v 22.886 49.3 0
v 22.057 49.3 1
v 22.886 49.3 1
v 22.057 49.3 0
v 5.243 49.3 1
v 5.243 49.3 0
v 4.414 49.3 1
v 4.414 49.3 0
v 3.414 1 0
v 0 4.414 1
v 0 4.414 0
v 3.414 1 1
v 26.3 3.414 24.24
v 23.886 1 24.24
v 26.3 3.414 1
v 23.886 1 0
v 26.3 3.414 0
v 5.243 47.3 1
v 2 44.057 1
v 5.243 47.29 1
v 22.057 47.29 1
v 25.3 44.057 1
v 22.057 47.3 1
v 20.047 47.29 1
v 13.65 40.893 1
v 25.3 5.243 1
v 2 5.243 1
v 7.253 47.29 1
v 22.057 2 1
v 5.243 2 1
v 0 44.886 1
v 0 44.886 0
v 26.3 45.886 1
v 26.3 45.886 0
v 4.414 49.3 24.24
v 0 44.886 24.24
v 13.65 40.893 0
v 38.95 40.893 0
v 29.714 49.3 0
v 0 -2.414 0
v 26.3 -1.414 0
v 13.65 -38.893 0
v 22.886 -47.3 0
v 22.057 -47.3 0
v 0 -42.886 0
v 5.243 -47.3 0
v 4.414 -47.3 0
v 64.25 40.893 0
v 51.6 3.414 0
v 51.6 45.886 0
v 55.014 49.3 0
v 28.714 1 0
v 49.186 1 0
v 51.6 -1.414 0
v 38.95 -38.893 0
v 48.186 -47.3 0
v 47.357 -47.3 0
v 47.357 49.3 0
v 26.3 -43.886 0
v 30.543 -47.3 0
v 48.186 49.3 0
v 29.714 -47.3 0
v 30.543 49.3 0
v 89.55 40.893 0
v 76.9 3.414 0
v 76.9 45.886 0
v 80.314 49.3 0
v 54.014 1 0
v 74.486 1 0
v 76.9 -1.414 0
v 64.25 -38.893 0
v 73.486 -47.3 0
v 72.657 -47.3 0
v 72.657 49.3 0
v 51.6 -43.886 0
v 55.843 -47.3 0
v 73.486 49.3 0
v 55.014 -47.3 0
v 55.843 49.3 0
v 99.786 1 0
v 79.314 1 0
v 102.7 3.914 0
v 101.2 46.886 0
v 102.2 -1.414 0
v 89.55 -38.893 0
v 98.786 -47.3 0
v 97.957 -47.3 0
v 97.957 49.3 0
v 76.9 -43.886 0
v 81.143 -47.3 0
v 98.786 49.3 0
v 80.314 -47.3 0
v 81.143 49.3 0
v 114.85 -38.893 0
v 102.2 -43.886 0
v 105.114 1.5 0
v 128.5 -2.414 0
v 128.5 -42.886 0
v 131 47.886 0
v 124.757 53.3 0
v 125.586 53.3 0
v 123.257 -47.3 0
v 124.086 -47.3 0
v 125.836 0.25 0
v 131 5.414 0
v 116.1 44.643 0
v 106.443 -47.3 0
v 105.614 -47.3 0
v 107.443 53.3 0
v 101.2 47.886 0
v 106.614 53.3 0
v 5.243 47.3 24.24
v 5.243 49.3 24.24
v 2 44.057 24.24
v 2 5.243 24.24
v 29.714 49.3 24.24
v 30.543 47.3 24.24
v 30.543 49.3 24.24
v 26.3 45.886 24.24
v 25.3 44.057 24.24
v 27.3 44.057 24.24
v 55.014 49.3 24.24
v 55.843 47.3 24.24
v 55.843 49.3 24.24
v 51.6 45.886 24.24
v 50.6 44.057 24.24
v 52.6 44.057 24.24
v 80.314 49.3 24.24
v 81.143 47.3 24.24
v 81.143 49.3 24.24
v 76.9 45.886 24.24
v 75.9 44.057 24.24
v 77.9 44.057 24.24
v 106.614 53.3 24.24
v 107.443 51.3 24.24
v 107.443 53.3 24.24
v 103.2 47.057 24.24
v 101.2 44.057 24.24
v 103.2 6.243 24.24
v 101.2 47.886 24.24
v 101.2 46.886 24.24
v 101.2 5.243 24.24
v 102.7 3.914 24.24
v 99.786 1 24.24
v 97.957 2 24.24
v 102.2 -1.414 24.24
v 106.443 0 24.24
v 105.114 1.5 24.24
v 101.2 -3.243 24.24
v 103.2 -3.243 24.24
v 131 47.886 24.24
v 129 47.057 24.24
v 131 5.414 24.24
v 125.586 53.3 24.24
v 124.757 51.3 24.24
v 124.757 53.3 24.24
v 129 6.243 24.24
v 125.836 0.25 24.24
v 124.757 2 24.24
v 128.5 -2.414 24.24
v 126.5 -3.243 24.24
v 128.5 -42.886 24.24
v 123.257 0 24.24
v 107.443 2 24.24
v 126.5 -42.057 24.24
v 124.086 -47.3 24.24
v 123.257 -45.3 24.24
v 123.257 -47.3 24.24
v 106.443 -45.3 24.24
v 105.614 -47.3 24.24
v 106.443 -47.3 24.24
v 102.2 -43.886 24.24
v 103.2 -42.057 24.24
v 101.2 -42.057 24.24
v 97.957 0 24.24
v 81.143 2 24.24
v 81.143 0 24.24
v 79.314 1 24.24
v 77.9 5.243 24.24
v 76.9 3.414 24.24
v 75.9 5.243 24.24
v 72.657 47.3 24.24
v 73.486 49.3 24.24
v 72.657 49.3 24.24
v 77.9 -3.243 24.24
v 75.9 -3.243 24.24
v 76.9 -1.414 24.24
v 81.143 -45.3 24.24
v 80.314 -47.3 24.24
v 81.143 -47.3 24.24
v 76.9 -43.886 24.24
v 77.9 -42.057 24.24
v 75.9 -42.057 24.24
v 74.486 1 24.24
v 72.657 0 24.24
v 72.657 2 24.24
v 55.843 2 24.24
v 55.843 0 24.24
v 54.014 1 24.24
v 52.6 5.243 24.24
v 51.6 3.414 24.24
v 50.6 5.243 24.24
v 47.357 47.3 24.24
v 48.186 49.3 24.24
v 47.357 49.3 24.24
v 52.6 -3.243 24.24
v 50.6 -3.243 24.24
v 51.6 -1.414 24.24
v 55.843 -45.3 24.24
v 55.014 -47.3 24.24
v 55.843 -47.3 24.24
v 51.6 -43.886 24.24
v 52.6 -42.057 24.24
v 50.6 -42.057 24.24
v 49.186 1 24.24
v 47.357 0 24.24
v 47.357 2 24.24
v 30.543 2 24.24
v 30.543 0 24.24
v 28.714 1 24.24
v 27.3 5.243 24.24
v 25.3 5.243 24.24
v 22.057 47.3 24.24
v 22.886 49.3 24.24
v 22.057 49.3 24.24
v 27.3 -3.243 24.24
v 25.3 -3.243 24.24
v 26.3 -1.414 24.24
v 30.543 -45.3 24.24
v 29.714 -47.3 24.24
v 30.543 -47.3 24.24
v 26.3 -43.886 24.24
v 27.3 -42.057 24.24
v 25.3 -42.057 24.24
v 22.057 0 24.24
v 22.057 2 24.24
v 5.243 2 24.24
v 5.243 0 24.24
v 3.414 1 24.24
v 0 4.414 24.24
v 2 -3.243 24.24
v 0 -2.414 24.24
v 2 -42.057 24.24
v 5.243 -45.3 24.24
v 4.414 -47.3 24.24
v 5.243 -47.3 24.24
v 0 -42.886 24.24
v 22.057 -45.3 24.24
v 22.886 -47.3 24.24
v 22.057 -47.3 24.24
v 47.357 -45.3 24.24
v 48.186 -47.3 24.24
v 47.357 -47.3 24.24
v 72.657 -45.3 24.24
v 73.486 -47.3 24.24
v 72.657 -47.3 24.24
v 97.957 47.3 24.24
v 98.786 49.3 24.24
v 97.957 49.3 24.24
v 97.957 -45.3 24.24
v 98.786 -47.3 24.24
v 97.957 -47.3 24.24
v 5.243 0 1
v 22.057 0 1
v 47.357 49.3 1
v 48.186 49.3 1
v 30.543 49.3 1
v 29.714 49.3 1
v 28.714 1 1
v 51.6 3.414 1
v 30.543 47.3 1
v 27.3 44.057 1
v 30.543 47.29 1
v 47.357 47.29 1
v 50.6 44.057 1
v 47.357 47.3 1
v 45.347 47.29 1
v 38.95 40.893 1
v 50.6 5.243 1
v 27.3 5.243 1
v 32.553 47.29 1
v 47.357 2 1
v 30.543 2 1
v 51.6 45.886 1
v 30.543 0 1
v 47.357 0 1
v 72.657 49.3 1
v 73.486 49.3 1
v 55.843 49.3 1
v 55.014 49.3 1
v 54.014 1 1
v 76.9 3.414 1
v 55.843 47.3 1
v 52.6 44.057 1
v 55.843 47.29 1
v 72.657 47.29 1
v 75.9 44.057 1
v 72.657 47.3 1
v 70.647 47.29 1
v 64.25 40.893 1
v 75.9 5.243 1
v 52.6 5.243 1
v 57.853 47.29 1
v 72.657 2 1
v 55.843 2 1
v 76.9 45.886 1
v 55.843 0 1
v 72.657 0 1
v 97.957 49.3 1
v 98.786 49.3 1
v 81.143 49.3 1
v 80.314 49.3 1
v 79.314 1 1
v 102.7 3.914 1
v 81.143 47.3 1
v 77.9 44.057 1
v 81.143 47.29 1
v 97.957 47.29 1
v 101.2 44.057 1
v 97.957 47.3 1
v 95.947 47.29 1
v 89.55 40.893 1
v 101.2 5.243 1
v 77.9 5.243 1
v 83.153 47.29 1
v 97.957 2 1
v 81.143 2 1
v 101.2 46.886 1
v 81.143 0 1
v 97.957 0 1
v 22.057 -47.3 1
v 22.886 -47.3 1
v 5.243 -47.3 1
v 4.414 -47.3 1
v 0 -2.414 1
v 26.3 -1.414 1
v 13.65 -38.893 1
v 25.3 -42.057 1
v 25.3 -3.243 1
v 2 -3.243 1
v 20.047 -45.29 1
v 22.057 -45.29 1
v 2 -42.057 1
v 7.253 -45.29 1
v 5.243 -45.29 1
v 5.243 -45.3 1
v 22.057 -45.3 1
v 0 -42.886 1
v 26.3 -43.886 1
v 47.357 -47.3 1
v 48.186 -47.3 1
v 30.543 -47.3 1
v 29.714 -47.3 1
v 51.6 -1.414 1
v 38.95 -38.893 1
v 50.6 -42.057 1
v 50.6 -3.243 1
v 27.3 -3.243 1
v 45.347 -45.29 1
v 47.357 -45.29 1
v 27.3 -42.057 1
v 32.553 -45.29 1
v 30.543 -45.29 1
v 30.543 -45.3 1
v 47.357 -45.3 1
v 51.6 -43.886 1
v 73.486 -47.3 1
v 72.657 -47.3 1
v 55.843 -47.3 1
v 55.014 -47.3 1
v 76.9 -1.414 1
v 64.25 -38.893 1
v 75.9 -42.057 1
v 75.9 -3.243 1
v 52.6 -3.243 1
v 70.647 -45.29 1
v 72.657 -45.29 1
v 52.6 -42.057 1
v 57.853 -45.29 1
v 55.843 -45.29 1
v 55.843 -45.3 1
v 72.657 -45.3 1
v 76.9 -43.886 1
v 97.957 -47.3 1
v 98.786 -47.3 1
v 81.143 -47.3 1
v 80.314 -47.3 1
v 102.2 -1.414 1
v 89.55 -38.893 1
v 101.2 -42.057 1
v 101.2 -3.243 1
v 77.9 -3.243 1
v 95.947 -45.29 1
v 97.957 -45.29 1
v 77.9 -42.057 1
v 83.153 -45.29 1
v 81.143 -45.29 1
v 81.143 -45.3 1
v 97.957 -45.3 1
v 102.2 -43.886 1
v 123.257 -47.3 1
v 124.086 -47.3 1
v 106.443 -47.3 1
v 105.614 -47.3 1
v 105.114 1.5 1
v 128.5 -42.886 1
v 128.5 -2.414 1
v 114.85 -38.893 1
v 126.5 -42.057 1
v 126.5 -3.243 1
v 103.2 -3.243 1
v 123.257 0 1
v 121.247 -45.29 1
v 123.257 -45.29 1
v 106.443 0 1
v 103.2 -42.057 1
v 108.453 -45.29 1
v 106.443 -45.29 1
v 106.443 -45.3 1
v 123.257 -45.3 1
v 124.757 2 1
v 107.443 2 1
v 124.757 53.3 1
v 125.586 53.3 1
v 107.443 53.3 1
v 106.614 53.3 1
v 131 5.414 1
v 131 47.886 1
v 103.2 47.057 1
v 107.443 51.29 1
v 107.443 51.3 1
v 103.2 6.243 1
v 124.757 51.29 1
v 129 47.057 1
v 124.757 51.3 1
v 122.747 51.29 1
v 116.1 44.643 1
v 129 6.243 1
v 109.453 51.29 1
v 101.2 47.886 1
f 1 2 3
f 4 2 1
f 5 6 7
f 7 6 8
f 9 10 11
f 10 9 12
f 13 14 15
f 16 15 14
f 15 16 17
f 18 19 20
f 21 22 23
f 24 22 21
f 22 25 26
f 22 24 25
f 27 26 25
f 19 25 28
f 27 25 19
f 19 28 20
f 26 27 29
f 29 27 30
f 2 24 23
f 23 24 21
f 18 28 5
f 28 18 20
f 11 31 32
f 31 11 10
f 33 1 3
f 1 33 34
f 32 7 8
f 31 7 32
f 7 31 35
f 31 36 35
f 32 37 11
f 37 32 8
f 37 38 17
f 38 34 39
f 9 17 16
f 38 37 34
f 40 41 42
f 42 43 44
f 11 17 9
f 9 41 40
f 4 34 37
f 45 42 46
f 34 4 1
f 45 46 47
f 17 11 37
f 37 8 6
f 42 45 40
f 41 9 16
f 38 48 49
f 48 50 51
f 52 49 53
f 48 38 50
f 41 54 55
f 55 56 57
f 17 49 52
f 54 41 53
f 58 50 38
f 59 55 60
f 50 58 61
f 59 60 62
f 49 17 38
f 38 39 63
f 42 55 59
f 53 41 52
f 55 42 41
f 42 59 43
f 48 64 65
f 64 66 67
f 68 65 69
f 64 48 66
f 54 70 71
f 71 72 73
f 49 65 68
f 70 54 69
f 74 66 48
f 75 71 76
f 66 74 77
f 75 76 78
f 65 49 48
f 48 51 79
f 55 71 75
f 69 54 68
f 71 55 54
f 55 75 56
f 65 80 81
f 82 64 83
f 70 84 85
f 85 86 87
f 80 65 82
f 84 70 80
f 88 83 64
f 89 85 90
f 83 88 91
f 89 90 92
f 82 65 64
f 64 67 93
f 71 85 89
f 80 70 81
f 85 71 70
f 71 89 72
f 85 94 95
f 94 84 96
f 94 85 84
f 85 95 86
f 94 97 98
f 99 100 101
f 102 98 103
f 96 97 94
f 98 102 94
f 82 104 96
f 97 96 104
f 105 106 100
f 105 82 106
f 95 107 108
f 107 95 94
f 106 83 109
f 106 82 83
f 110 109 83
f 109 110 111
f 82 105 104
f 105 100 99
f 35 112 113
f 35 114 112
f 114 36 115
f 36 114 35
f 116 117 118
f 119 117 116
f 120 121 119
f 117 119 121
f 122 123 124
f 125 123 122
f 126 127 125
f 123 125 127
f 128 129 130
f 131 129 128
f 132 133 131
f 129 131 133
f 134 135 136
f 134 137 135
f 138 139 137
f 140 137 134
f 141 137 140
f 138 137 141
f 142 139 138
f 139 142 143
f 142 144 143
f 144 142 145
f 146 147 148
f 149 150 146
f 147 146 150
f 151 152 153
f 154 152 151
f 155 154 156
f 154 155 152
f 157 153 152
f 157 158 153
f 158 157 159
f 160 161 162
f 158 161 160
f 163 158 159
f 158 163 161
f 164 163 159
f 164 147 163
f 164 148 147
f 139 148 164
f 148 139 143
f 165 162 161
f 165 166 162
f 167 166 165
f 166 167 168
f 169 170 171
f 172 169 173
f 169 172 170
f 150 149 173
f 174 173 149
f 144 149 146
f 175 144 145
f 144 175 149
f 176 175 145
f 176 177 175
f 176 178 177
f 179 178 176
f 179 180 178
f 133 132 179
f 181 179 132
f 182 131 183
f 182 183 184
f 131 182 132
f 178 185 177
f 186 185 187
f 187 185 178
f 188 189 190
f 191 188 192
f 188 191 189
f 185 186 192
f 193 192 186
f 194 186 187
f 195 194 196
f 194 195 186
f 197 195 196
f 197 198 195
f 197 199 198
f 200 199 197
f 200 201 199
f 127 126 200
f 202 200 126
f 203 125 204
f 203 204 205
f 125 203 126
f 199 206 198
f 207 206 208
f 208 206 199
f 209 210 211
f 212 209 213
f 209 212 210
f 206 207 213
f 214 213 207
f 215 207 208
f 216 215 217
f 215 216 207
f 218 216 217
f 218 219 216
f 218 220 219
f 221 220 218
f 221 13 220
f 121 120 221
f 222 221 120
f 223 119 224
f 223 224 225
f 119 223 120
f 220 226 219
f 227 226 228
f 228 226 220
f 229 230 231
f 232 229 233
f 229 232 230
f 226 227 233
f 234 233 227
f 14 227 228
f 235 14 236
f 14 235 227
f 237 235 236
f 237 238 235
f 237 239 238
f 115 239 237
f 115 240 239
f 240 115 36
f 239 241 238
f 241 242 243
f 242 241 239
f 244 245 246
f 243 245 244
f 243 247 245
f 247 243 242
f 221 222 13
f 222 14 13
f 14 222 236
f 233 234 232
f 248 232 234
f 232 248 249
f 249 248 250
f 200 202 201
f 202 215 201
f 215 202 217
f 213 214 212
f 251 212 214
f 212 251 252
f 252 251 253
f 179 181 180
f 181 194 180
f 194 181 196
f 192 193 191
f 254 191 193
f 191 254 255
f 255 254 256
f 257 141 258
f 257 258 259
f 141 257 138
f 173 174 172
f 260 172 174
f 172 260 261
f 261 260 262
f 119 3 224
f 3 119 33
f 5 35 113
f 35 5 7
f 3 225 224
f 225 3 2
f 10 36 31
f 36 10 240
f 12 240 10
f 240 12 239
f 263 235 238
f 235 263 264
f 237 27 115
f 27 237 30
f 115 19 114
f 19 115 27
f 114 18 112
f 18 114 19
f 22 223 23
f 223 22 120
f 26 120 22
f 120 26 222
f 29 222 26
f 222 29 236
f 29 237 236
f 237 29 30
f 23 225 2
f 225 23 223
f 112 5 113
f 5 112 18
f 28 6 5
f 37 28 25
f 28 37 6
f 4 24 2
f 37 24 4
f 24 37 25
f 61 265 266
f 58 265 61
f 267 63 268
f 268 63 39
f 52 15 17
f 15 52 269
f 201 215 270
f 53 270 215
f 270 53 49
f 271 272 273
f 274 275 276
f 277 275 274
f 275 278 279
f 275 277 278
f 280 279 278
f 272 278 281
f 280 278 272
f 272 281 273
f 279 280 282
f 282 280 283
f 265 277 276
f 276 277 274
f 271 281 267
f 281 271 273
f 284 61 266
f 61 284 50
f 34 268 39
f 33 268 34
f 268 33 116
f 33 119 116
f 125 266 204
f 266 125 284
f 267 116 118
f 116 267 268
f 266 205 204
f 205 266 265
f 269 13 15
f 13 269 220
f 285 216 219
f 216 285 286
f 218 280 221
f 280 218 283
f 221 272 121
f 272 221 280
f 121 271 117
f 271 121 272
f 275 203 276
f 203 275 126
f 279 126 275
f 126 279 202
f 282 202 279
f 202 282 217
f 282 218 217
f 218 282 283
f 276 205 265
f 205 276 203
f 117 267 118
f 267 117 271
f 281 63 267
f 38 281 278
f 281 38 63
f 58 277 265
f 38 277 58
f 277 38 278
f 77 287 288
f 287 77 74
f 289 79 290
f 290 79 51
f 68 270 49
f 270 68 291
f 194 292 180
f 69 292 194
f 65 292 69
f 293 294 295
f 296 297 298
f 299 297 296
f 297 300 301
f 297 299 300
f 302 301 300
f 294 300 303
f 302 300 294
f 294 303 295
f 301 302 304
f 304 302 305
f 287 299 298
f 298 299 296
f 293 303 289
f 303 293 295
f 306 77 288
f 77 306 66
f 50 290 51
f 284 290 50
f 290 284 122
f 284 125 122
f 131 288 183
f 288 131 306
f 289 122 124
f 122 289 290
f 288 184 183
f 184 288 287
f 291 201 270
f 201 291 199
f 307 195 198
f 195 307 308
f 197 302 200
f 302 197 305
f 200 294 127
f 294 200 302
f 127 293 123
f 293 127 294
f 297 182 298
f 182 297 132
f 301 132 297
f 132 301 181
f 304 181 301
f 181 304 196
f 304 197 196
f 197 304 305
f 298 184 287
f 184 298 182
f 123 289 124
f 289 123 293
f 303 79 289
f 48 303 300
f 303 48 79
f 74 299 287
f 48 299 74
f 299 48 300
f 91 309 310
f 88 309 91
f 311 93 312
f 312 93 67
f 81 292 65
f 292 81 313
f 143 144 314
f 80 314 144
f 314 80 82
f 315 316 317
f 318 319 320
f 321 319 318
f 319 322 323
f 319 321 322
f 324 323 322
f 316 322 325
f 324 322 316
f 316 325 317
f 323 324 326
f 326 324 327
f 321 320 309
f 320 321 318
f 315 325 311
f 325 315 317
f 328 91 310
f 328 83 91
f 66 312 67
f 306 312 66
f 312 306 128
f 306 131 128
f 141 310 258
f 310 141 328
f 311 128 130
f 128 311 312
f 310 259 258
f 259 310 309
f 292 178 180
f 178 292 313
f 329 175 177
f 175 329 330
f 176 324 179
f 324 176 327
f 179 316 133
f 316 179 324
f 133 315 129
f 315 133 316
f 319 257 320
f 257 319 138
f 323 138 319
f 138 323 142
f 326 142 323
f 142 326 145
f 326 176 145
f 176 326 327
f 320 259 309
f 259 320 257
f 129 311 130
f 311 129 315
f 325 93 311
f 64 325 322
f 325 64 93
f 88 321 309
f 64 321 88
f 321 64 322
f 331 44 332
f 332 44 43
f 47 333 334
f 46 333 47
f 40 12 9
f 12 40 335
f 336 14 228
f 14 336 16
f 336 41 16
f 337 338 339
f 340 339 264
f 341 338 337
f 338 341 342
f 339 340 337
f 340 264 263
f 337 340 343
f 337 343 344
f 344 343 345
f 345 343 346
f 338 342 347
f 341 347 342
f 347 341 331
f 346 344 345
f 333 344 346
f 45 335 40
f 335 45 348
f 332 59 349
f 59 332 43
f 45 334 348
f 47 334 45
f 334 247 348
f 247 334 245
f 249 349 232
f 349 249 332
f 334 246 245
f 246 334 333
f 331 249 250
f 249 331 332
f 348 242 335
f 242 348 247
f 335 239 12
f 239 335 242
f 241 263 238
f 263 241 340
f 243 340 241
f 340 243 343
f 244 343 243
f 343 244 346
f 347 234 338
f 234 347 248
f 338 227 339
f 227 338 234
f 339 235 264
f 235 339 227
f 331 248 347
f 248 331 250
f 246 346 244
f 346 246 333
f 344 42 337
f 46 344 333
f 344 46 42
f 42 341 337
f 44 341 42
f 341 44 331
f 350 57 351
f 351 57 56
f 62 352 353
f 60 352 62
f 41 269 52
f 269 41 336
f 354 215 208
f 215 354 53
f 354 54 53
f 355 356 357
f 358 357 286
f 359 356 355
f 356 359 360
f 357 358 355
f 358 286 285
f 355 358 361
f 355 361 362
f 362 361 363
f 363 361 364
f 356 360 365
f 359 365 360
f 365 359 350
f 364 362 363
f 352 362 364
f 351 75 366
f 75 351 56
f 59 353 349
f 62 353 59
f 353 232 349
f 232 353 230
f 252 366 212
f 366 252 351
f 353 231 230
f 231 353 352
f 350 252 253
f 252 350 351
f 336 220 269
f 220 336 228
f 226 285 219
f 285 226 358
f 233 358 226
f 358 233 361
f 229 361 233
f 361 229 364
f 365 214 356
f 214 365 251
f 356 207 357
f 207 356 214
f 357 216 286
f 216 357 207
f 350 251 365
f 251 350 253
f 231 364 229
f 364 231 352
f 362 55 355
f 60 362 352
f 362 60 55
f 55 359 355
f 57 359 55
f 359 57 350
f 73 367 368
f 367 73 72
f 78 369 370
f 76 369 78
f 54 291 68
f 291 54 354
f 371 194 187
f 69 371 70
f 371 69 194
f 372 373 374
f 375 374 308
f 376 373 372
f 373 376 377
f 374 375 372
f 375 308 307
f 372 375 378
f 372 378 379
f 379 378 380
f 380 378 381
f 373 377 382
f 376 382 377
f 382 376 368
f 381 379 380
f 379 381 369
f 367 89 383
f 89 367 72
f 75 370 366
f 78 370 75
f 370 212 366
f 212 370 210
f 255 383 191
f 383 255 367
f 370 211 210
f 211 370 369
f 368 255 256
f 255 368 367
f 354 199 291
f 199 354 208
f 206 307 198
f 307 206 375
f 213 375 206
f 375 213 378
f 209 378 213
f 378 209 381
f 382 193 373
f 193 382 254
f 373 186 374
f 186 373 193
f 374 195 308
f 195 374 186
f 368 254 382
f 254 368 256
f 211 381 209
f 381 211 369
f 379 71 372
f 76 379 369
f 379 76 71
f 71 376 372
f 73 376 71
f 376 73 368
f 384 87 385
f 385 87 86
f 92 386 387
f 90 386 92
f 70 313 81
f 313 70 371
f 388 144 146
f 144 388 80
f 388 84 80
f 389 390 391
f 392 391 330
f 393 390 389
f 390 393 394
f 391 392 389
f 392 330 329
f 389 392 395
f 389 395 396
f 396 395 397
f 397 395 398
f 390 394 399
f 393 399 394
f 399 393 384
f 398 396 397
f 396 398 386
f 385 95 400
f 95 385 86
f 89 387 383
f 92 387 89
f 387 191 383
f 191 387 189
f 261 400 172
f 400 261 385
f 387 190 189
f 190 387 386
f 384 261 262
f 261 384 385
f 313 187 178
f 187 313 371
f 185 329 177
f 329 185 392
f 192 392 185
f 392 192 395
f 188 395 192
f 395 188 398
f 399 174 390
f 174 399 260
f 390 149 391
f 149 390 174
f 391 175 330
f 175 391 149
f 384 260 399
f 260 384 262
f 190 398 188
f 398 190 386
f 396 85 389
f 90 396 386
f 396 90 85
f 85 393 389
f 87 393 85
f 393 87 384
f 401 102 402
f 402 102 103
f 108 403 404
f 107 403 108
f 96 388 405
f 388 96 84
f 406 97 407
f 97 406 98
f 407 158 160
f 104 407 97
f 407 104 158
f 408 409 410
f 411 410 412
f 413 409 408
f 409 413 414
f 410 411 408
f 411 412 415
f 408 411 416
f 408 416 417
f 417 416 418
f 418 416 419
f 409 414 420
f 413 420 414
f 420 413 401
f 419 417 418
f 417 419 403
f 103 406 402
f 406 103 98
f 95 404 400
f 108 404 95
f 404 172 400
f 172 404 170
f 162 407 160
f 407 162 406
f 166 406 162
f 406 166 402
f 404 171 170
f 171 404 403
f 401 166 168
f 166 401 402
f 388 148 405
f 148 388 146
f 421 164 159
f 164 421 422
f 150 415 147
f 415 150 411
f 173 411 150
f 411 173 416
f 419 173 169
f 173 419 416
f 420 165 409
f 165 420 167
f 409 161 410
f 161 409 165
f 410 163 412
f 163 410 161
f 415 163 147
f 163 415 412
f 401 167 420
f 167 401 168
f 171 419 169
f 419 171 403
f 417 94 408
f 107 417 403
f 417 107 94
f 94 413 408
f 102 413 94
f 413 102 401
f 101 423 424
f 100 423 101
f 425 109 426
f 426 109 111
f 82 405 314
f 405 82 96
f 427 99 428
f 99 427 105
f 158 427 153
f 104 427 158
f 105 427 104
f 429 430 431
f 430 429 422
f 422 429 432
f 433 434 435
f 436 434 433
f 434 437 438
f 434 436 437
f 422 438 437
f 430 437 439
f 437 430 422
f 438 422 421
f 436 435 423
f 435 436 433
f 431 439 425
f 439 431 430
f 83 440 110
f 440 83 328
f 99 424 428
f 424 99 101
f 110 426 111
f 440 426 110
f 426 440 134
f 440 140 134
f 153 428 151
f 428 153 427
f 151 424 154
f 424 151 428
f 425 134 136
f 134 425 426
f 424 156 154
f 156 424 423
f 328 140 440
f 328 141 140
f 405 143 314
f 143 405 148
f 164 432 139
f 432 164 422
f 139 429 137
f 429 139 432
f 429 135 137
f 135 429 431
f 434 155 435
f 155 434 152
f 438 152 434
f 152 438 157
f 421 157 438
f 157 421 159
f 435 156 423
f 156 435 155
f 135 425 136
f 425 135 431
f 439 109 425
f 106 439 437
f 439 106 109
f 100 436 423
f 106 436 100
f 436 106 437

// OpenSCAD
// Global resolution
//$fs = 0.1;  // Don't generate smaller facets than 0.1 mm
//$fa = 5;    // Don't generate larger angles than 5 degrees

/* [Hidden] */
// fudge sizes
// this make preview happier, but the exported model will have more faces
$f = 0.0; // set to zero when exporting
$g = 0.01; // safe to leave as non-zero

/* [Parameters] */
part = "chipHolder"; //[chipHolder:Chip Holder,chipHolderLid:Chip Holder Lid,chipHolderSizedDividedBox:Chip-sized Box,chipHolderSizedLid:Chip-sized Box Lid,goodsHolderBox:Goods Box,goodsHolderBumpyBox:Goods Bumpy Box,goodsHolderLid:Goods Lid]

//play (chip holder length and width will be increased by this much)
play = [2,2];

//thickness of the walls
wallThickness = 2; //[1:0.5:4]
//flat surfaces, also the thickness of the lid
bottomThickness = 1; //[0.5:0.5:3]
//lip of lid thickness
lipThickness = 3;
//lip fudge (will be double this value)
lipFudge = 0.25;

// How much height you have in your box (the chipHolderBox will be sized to fit on top of the chipHolder, and the goodsHolderBox will be half this height)
maxClearance = 40; //[20:60]

// Chip's thickness, length, width, cornerLength/Width
chipDimensions = [1.66, 43.3, 21.3, 3];
// Widechip's thickness, lenght, width, cornerLenght/Width
wideChipDimensions = [1.66, 47.3, 23.8, 4];

// First row - How many chip holders to make, and how many they should hold (best if all the same value)
chipCountsA = [14,14,14,14,14];
// Second row - How many chip holders to make, and how many they should hold (best if all the same value)
chipCountsB = [14,14,14,14];
// Second row, wide chip counter (if any of these chip counts do not match, the lid will not be useful)
wideChipCount = 14;

// First row - Chip counter box divison sizes. (one extra box is made with the remainder)
boxDivisionsA = [0.333,0.333];
// First row - Chip counter box division sizes. (one extra box is made with the remainder)
boxDivisionsB = [0.25,0.50];

// How big should one of the four holders be
goodsHolderBoxSize = 50;//[20:75]
// How much chamfer
goodsHolderCornerSize = 20;//[0:75]

// Print bumps on bottom of chipholder
goodsHolderBumpSize = 6;

/* [Hidden] */
goodsHolderBoxHeight = 40/2 - bottomThickness;

chipHolderHeight = max(
        max(chipDimensions[0]*max(max(chipCountsA), max(chipCountsB))),
        wideChipDimensions[0]*wideChipCount);
echo("chipHolder height:", chipHolderHeight);
echo("chipHolderLid (effective) height:", bottomThickness);

remainingHeight = maxClearance - chipHolderHeight - bottomThickness;
echo("remaining height:", remainingHeight);

/* I use these values for my smaller 3D printer and box size, so I can't use the divided box. */
// First row - How many chip holders to make, and how many they should hold (best if all the same value)
//chipCountsA = [22.5,22.5,22.5,22.5];
// Second row - How many chip holders to make, and how many they should hold (best if all the same value)
//chipCountsB = [22.5,22.5,22.5];
// Second row, wide chip counter (if any of these chip counts do not match, the lid will not be useful)
//wideChipCount = 22.5;



// one wide chip is added to the end of chipCountsB

module octagon(width, length, innerWidth, innerLength) {
    width = width / 2;
    length = length / 2;
    innerWidth = innerWidth / 2;
    innerLength = innerLength / 2;
    points = [
        [-width, innerLength], [-innerWidth, length], // top-left corner
        [innerWidth, length], [width, innerLength], // top-right corner
        [width, -innerLength], [innerWidth, -length], // bottom-right corner
        [-innerWidth, -length], [-width, -innerLength]]; // bottom-left corner
    
    translate([width, length]) polygon(points, [[0,1,2,3,4,5,6,7,8]]);
}

module surface2DToBox(height, thickness, bottomThickness, chamfer) {
    linear_extrude(bottomThickness) children(0);
    translate([0,0,bottomThickness]) linear_extrude(height) difference() {
        offset(0) children(0);
        offset(delta=-thickness, chamfer=chamfer) children(0);
    }
}

module surfaceToBox(height, thickness, bottomThickness, chamfer) {
    surface2DToBox(height, thickness, bottomThickness, chamfer) projection() children(0);
}

// print the lid part, or just the lip
module surface2DToLid(thickness, lidThickness, chamfer, printLid=true) {
    rotate([180,0,0]) translate([0,0,-lidThickness]) {
        if(printLid) {
            linear_extrude(lidThickness) offset(delta=1.5, chamfer=chamfer) children(0);
        }
        translate([0,0,-thickness]) linear_extrude(thickness) difference() {
            offset(delta=1.5, chamfer=chamfer) children(0);
            offset(delta=lipFudge) children(0);
        }
    }
}

module surfaceToLid(thickness, lidThickness, chamfer) {
    surface2DToLid(thickness, lidThickness, chamfer) projection() children(0);
}

// the inside octagon's innerWidth and innerLength is defined as:
// innerWidth - tan(theta/2) * wallThickness
// *and*
// innerLength - tan((theta-90)/2) * wallThickness
// theta is the angle produced from the right triangle sitting outside the octagon:
// theta = atan((length - innerLength)/(width - innerWidth));
// sigma = 90 - theta;
// widthAdjust = tan(theta/2) * wallThickness;
// lengthAdjust = tan(sigma/2) * wallThickness;
function hollowOctagonSolidInnerVector(width, length, innerWidth, innerLength, wallThickness) = [
    tan(atan((length - innerLength)/(width - innerWidth))/2) * wallThickness*2,
    tan(atan((width - innerWidth)/(length - innerLength))/2) * wallThickness*2
];

module octagonBox(width, length, innerWidth, innerLength, wallThickness, height, bottomWallThickness) {
    surface2DToBox(height, wallThickness, bottomWallThickness, true)
        octagon(width, length, innerWidth, innerLength);
}

module chipHolder(chipDimensions, chipCount, wallThickness, bottomWallThickness) {
    outerWidth = chipDimensions[2] + wallThickness*2 + play[0];
    outerLength = chipDimensions[1] + wallThickness*2 + play[1];
    innerWidth = outerWidth - chipDimensions[3]*2 - sqrt(2)*wallThickness;
    innerLength = outerLength - chipDimensions[3]*2 - sqrt(2)*wallThickness;
    height = chipCount * chipDimensions[0];
    innerVector = hollowOctagonSolidInnerVector(width=outerWidth, length=outerLength,
            innerWidth=innerWidth, innerLength=innerLength,
            wallThickness=wallThickness);
    cutawayWidth = innerWidth - innerVector[0];
    cutawayLength = innerLength - innerVector[1];
    
    difference() {
        octagonBox(width=outerWidth, length=outerLength,
            innerWidth=innerWidth, innerLength=innerLength,
            wallThickness=wallThickness,
            height=height,
            bottomWallThickness=bottomWallThickness);
        // side wall cutout
        translate([outerWidth/2-cutawayWidth/2,outerLength-wallThickness-$g,bottomWallThickness-$f])
            cube([cutawayWidth, wallThickness+$g+$g, height + $f+$g]);
        // bottom cutout
        translate([outerWidth/2,outerLength-cutawayWidth*sqrt(2)/2*sqrt(2)/2,-$g])
            rotate(45)
            cube([cutawayWidth*sqrt(2)/2, cutawayWidth*sqrt(2)/2, bottomWallThickness + $g*2]);
    }
}

module moveChipInRow(chipDimensions, wallThickness, i) {
    translate([(chipDimensions[2]+wallThickness+play[0])*i,0,0])
        children(0);
}

module chipHolderRow(chipDimensions, chipCounts, wallThickness, bottomWallThickness) {
    for(i = [0:len(chipCounts)-1])
        moveChipInRow(chipDimensions, wallThickness, i) 
            chipHolder(chipDimensions=chipDimensions, chipCount=chipCounts[i], wallThickness=wallThickness, bottomWallThickness=1);
}

module fullChipHolder() {
    mirror([0,1,0]) translate([0,-wallThickness,0]) chipHolderRow(chipDimensions=chipDimensions, chipCounts=chipCountsA, wallThickness=wallThickness, bottomWallThickness=bottomThickness);
    chipHolderRow(chipDimensions=chipDimensions, chipCounts=chipCountsB, wallThickness=wallThickness, bottomWallThickness=1);
    moveChipInRow(chipDimensions, wallThickness, len(chipCountsB)) chipHolder(chipDimensions=wideChipDimensions, chipCount=wideChipCount, wallThickness=wallThickness, bottomWallThickness=1);
}

function _plateWidth(chipDimensions, chipHolders, wallThickness, extraHolderWidth) =
    chipHolders*(chipDimensions[2]+wallThickness+play[0]);
function plateWidth(chipDimensions, chipHolders, wallThickness, extraHolderWidth) =
    extraHolderWidth ?
        _plateWidth(chipDimensions, chipHolders, wallThickness, extraHolderWidth) + extraHolderWidth + wallThickness + play[0] :
        _plateWidth(chipDimensions, chipHolders, wallThickness, extraHolderWidth);

module chipHolderPlate(chipDimensions, chipHolders, wallThickness, plateThickness, cornerOffset, extraHolderWidth, lengthOverride, extraLength=0) {
    width = plateWidth(chipDimensions, chipHolders, wallThickness, extraHolderWidth);
    length = lengthOverride ? lengthOverride + extraLength : chipDimensions[1] + extraLength;

    outerWidth = width + wallThickness;
    outerLength = length + wallThickness*2;
    innerWidth = outerWidth - cornerOffset*2 - sqrt(2)*wallThickness;
    innerLength = outerLength - cornerOffset*2 - sqrt(2)*wallThickness;

    linear_extrude(plateThickness)
        octagon(outerWidth,outerLength,innerWidth,innerLength);
}

module fullChipHolderPlate(extraLength=0) {
    translate([0,0,-1]) {
        mirror([0,1,0]) translate([0,-wallThickness,0]) chipHolderPlate(chipDimensions, len(chipCountsA), wallThickness, 1, chipDimensions[3], extraLength=extraLength);
        chipHolderPlate(chipDimensions, len(chipCountsB), wallThickness, 1, wideChipDimensions[3], wideChipDimensions[2], wideChipDimensions[1], extraLength=extraLength);
    }
}

module chipHolderLid() {
    rotate([180,0,0])
        translate([0,0,-bottomThickness]) linear_extrude(bottomThickness) offset(delta=1.5) projection() fullChipHolderPlate(1.5);
    translate([0,0,-$g]) surface2DToLid(lipThickness+$g,bottomThickness, chamfer=true, printLid=false) 
        projection(cut=true) translate([0,0,-lipThickness+bottomThickness]) fullChipHolder();
}


module chipHolderSizedBox() {
    surfaceToBox(remainingHeight - bottomThickness, wallThickness, bottomThickness, true)
        fullChipHolderPlate();
}

function _sumArray(array, acc, start, end) = 
    start > end ? acc : _sumArray(array, acc + array[start] , start + 1, end);
function sumArray(array,end) = _sumArray(array, 0, 0, end);

module chipHolderSizedDividedBox() {
    height = remainingHeight - bottomThickness;
    
    aWidth = plateWidth(chipDimensions, len(chipCountsA), wallThickness);
    aLength = chipDimensions[1] + wallThickness + $g;

    bWidth = plateWidth(chipDimensions, len(chipCountsB), wallThickness, wideChipDimensions[2]);
    bLength = wideChipDimensions[1] + wallThickness + $g;

    surfaceToBox(height, wallThickness, bottomThickness, true)
        mirror([0,1,0]) translate([0,-wallThickness,0]) chipHolderPlate(chipDimensions, len(chipCountsA), wallThickness, 1, chipDimensions[3]);
    surfaceToBox(height, wallThickness, bottomThickness, true)
        chipHolderPlate(chipDimensions, len(chipCountsB), wallThickness, 1, wideChipDimensions[3], wideChipDimensions[2], wideChipDimensions[1]);
    
    mirror([0,1,0]) for(i = [0:len(boxDivisionsA)-1]) {
        translate([(aWidth-wallThickness*2)*sumArray(boxDivisionsA,i)+wallThickness/2,$g,bottomThickness]) cube([wallThickness, aLength, height]);
    }

    for(i = [0:len(boxDivisionsB)-1]) {
        translate([(bWidth-wallThickness*2)*sumArray(boxDivisionsB,i)+wallThickness/2,$g,bottomThickness]) cube([wallThickness, bLength, height]);
    }
}

module chipHolderSizedLid() {
    surfaceToLid(lipThickness, bottomThickness, true)
        fullChipHolderPlate();
}

module goodsHolderSurface() {
    offset = goodsHolderBoxSize-wallThickness;
    innerSize = goodsHolderBoxSize-goodsHolderCornerSize;
    translate([0,0,0]) octagon(goodsHolderBoxSize,goodsHolderBoxSize,
        innerSize,innerSize);
    translate([offset,0,0]) octagon(goodsHolderBoxSize,goodsHolderBoxSize,
        innerSize,innerSize);
    translate([0,offset,0]) octagon(goodsHolderBoxSize,goodsHolderBoxSize,
        innerSize,innerSize);
    translate([offset,offset,0]) octagon(goodsHolderBoxSize,goodsHolderBoxSize,
        innerSize,innerSize);
}

module bumps(width, length, innerWidth, innerLength, wallThickness, bottomThickness) {
    if(goodsHolderBumpSize > 0) {
        length = length - wallThickness*2;
        width = width - wallThickness*2;
        rows = floor(length/goodsHolderBumpSize/2);
        columns = floor(width/goodsHolderBumpSize/2);
        lengthOffset = (length - rows*goodsHolderBumpSize*2)/2 + wallThickness + goodsHolderBumpSize/2;
        widthOffset = (width - columns*goodsHolderBumpSize*2)/2 + wallThickness + goodsHolderBumpSize/2;
        
        // TODO: this doesn't take into account chamfer
        translate([widthOffset, lengthOffset, bottomThickness])
        for(y = [0:rows-1]) {
            translate([0,y*goodsHolderBumpSize*2,0])
            for(x = [0:columns-1]) {
                translate([x*goodsHolderBumpSize*2,0]) {
                    translate([goodsHolderBumpSize/2,goodsHolderBumpSize/2,-goodsHolderBumpSize/2000])
                    difference() {
                        translate([0,0,-goodsHolderBumpSize/sqrt(2)/2])
                        rotate([45,45,45])
                            cube([goodsHolderBumpSize,goodsHolderBumpSize,goodsHolderBumpSize], center=true);
                        translate([0,0,-goodsHolderBumpSize])
                        cube([goodsHolderBumpSize*2,goodsHolderBumpSize*2,goodsHolderBumpSize*2], center=true);
                    }
                }
            }
        }
    }
}

module goodsHolderBox(bumps=false) {
//    surface2DToBox(goodsHolderBoxHeight, wallThickness, bottomThickness, true) goodsHolderSurface();
    offset = goodsHolderBoxSize-wallThickness;
    innerSize = goodsHolderBoxSize-goodsHolderCornerSize;
    translate([0,0,0]) {
        surface2DToBox(goodsHolderBoxHeight-bottomThickness, wallThickness, bottomThickness, true)
            octagon(goodsHolderBoxSize,goodsHolderBoxSize, innerSize,innerSize);
        if(bumps) bumps(goodsHolderBoxSize,goodsHolderBoxSize,innerSize,innerSize, wallThickness, bottomThickness);
    }
    translate([offset,0,0]) {
        surface2DToBox(goodsHolderBoxHeight-bottomThickness, wallThickness, bottomThickness, true)
            octagon(goodsHolderBoxSize,goodsHolderBoxSize, innerSize,innerSize);
        if(bumps) bumps(goodsHolderBoxSize,goodsHolderBoxSize,innerSize,innerSize, wallThickness, bottomThickness);
    }
    translate([0,offset,0]) {
        surface2DToBox(goodsHolderBoxHeight-bottomThickness, wallThickness, bottomThickness, true)
            octagon(goodsHolderBoxSize,goodsHolderBoxSize, innerSize,innerSize);
        if(bumps) bumps(goodsHolderBoxSize,goodsHolderBoxSize,innerSize,innerSize, wallThickness, bottomThickness);
    }
    translate([offset,offset,0]) {
        surface2DToBox(goodsHolderBoxHeight-bottomThickness, wallThickness, bottomThickness, true)
            octagon(goodsHolderBoxSize,goodsHolderBoxSize, innerSize,innerSize);
        if(bumps) bumps(goodsHolderBoxSize,goodsHolderBoxSize,innerSize,innerSize, wallThickness, bottomThickness);
    }
}

module goodsHolderLid() {
    surface2DToLid(lipThickness, bottomThickness, true) goodsHolderSurface();
}

//octagonBox(width=40,length=20, innerWidth=40-3,innerLength=20-6, wallThickness=wallThickness, height=40, bottomWallThickness=4);
//chipHolder(chipDimensions=chipDimensions, chipCount=10, wallThickness=wallThickness, bottomWallThickness=1);

if(part=="chipHolder") {
    fullChipHolder();
} else if(part=="chipHolderLid") {
    chipHolderLid();
} else if(part=="chipHolderSizedDividedBox") {
    chipHolderSizedDividedBox();
} else if(part=="chipHolderSizedLid") {
    chipHolderSizedLid();
} else if(part=="goodsHolderBox") {
    goodsHolderBox();
} else if(part=="goodsHolderBumpyBox") {
    goodsHolderBox(true);
} else if(part=="goodsHolderLid") {
    goodsHolderLid();
}
